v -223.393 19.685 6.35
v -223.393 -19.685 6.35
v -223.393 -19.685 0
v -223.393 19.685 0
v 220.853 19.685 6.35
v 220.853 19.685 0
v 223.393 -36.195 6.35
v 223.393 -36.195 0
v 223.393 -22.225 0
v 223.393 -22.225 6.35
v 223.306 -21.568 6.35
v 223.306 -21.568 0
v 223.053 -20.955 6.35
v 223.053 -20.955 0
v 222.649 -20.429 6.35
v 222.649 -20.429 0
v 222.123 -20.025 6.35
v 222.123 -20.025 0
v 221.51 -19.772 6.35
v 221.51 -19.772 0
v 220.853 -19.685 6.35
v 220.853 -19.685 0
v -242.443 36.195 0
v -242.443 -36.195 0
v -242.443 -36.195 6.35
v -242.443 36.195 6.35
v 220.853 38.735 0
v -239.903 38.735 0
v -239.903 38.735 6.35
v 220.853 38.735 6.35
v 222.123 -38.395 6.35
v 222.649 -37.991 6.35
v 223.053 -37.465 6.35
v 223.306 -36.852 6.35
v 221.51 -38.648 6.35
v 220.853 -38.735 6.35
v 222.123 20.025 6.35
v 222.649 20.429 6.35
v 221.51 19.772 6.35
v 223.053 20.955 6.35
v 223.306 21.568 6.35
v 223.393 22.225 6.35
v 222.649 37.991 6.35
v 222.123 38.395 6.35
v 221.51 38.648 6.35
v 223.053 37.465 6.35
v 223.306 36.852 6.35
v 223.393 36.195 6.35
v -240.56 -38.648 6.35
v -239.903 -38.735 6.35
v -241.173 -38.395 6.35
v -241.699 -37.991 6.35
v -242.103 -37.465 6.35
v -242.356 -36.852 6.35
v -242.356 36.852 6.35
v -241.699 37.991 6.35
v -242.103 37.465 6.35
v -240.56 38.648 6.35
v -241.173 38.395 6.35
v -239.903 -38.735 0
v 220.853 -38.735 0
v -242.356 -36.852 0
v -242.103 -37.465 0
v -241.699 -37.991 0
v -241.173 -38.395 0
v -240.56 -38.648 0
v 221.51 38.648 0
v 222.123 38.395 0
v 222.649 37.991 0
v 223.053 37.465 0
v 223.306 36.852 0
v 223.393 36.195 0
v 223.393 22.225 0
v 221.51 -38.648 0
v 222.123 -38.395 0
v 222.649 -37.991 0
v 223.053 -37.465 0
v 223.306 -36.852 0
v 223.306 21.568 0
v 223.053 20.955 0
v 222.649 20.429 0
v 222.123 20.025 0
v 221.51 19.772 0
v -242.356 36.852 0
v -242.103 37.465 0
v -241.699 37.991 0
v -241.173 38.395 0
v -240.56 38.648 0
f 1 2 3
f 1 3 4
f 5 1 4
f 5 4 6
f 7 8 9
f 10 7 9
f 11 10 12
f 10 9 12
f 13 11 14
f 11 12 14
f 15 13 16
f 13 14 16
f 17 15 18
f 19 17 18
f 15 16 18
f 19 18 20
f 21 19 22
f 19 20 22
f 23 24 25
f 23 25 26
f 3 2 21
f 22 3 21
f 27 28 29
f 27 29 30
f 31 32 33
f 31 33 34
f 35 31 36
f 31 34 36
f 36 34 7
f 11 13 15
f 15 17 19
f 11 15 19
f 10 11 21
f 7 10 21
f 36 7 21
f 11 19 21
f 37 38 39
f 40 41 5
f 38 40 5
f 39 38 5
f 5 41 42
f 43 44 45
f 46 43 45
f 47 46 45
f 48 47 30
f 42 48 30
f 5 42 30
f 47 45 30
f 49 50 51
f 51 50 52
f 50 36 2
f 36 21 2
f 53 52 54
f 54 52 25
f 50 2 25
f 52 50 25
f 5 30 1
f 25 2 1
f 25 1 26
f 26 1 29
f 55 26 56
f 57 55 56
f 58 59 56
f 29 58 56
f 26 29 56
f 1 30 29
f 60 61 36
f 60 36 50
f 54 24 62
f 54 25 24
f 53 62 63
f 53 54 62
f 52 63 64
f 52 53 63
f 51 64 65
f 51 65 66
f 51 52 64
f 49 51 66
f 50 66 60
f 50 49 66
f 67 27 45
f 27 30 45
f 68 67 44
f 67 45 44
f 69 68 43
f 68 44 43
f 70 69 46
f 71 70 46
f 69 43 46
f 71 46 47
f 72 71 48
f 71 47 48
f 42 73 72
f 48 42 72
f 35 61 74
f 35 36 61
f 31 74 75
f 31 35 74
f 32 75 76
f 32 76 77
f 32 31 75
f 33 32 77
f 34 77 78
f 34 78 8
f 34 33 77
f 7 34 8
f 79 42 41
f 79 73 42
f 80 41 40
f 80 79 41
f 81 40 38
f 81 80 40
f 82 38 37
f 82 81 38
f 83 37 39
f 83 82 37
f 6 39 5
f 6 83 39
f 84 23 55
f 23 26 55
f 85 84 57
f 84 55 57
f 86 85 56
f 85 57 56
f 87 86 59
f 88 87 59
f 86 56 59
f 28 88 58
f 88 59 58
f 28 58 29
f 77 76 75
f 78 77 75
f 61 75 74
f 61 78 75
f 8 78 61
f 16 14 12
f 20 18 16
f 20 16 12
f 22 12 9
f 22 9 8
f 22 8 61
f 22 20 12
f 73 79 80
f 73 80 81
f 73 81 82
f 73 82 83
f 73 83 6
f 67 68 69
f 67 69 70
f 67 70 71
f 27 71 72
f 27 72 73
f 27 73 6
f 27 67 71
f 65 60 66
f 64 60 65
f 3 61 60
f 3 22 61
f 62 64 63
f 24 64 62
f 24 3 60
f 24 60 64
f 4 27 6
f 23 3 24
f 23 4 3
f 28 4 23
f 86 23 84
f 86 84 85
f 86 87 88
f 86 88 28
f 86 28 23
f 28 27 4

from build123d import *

# Parameters (mm, degrees)
SALIENTE_EXTRUIR1_DEPTH = 6.35
CROQUIS3_W              = 446.786
CROQUIS3_H              = 39.37
CORTAR_EXTRUIR1_DEPTH   = 246.599940908
REDONDEO2_R             = 2.54


with BuildPart() as part:
    # Croquis2 → Saliente-Extruir1 (new body)
    with BuildSketch(Plane.XY):
        Polygon((-242.443, -38.735), (-242.443, 38.735), (223.393, 38.735), (223.393, 19.685), (223.393, -19.685), (223.393, -38.735), align=None)
    extrude(amount=SALIENTE_EXTRUIR1_DEPTH)

    # Croquis3 → Cortar-Extruir1 (cut, through all)
    with BuildSketch(Plane.XY.offset(6.35)):
        Rectangle(CROQUIS3_W, CROQUIS3_H)
    extrude(amount=-CORTAR_EXTRUIR1_DEPTH, mode=Mode.SUBTRACT)

    # Redondeo2
    redondeo2_edges = [part.edges().sort_by_distance(p)[0] for p in [
        (223.393, -38.735, 3.175),
        (-242.443, -38.735, 3.175),
        (-242.443, 38.735, 3.175),
        (223.393, 38.735, 3.175),
        (223.393, 19.685, 3.175),
        (223.393, -19.685, 3.175),
    ]]
    fillet(redondeo2_edges, radius=REDONDEO2_R)


solid = part.part
